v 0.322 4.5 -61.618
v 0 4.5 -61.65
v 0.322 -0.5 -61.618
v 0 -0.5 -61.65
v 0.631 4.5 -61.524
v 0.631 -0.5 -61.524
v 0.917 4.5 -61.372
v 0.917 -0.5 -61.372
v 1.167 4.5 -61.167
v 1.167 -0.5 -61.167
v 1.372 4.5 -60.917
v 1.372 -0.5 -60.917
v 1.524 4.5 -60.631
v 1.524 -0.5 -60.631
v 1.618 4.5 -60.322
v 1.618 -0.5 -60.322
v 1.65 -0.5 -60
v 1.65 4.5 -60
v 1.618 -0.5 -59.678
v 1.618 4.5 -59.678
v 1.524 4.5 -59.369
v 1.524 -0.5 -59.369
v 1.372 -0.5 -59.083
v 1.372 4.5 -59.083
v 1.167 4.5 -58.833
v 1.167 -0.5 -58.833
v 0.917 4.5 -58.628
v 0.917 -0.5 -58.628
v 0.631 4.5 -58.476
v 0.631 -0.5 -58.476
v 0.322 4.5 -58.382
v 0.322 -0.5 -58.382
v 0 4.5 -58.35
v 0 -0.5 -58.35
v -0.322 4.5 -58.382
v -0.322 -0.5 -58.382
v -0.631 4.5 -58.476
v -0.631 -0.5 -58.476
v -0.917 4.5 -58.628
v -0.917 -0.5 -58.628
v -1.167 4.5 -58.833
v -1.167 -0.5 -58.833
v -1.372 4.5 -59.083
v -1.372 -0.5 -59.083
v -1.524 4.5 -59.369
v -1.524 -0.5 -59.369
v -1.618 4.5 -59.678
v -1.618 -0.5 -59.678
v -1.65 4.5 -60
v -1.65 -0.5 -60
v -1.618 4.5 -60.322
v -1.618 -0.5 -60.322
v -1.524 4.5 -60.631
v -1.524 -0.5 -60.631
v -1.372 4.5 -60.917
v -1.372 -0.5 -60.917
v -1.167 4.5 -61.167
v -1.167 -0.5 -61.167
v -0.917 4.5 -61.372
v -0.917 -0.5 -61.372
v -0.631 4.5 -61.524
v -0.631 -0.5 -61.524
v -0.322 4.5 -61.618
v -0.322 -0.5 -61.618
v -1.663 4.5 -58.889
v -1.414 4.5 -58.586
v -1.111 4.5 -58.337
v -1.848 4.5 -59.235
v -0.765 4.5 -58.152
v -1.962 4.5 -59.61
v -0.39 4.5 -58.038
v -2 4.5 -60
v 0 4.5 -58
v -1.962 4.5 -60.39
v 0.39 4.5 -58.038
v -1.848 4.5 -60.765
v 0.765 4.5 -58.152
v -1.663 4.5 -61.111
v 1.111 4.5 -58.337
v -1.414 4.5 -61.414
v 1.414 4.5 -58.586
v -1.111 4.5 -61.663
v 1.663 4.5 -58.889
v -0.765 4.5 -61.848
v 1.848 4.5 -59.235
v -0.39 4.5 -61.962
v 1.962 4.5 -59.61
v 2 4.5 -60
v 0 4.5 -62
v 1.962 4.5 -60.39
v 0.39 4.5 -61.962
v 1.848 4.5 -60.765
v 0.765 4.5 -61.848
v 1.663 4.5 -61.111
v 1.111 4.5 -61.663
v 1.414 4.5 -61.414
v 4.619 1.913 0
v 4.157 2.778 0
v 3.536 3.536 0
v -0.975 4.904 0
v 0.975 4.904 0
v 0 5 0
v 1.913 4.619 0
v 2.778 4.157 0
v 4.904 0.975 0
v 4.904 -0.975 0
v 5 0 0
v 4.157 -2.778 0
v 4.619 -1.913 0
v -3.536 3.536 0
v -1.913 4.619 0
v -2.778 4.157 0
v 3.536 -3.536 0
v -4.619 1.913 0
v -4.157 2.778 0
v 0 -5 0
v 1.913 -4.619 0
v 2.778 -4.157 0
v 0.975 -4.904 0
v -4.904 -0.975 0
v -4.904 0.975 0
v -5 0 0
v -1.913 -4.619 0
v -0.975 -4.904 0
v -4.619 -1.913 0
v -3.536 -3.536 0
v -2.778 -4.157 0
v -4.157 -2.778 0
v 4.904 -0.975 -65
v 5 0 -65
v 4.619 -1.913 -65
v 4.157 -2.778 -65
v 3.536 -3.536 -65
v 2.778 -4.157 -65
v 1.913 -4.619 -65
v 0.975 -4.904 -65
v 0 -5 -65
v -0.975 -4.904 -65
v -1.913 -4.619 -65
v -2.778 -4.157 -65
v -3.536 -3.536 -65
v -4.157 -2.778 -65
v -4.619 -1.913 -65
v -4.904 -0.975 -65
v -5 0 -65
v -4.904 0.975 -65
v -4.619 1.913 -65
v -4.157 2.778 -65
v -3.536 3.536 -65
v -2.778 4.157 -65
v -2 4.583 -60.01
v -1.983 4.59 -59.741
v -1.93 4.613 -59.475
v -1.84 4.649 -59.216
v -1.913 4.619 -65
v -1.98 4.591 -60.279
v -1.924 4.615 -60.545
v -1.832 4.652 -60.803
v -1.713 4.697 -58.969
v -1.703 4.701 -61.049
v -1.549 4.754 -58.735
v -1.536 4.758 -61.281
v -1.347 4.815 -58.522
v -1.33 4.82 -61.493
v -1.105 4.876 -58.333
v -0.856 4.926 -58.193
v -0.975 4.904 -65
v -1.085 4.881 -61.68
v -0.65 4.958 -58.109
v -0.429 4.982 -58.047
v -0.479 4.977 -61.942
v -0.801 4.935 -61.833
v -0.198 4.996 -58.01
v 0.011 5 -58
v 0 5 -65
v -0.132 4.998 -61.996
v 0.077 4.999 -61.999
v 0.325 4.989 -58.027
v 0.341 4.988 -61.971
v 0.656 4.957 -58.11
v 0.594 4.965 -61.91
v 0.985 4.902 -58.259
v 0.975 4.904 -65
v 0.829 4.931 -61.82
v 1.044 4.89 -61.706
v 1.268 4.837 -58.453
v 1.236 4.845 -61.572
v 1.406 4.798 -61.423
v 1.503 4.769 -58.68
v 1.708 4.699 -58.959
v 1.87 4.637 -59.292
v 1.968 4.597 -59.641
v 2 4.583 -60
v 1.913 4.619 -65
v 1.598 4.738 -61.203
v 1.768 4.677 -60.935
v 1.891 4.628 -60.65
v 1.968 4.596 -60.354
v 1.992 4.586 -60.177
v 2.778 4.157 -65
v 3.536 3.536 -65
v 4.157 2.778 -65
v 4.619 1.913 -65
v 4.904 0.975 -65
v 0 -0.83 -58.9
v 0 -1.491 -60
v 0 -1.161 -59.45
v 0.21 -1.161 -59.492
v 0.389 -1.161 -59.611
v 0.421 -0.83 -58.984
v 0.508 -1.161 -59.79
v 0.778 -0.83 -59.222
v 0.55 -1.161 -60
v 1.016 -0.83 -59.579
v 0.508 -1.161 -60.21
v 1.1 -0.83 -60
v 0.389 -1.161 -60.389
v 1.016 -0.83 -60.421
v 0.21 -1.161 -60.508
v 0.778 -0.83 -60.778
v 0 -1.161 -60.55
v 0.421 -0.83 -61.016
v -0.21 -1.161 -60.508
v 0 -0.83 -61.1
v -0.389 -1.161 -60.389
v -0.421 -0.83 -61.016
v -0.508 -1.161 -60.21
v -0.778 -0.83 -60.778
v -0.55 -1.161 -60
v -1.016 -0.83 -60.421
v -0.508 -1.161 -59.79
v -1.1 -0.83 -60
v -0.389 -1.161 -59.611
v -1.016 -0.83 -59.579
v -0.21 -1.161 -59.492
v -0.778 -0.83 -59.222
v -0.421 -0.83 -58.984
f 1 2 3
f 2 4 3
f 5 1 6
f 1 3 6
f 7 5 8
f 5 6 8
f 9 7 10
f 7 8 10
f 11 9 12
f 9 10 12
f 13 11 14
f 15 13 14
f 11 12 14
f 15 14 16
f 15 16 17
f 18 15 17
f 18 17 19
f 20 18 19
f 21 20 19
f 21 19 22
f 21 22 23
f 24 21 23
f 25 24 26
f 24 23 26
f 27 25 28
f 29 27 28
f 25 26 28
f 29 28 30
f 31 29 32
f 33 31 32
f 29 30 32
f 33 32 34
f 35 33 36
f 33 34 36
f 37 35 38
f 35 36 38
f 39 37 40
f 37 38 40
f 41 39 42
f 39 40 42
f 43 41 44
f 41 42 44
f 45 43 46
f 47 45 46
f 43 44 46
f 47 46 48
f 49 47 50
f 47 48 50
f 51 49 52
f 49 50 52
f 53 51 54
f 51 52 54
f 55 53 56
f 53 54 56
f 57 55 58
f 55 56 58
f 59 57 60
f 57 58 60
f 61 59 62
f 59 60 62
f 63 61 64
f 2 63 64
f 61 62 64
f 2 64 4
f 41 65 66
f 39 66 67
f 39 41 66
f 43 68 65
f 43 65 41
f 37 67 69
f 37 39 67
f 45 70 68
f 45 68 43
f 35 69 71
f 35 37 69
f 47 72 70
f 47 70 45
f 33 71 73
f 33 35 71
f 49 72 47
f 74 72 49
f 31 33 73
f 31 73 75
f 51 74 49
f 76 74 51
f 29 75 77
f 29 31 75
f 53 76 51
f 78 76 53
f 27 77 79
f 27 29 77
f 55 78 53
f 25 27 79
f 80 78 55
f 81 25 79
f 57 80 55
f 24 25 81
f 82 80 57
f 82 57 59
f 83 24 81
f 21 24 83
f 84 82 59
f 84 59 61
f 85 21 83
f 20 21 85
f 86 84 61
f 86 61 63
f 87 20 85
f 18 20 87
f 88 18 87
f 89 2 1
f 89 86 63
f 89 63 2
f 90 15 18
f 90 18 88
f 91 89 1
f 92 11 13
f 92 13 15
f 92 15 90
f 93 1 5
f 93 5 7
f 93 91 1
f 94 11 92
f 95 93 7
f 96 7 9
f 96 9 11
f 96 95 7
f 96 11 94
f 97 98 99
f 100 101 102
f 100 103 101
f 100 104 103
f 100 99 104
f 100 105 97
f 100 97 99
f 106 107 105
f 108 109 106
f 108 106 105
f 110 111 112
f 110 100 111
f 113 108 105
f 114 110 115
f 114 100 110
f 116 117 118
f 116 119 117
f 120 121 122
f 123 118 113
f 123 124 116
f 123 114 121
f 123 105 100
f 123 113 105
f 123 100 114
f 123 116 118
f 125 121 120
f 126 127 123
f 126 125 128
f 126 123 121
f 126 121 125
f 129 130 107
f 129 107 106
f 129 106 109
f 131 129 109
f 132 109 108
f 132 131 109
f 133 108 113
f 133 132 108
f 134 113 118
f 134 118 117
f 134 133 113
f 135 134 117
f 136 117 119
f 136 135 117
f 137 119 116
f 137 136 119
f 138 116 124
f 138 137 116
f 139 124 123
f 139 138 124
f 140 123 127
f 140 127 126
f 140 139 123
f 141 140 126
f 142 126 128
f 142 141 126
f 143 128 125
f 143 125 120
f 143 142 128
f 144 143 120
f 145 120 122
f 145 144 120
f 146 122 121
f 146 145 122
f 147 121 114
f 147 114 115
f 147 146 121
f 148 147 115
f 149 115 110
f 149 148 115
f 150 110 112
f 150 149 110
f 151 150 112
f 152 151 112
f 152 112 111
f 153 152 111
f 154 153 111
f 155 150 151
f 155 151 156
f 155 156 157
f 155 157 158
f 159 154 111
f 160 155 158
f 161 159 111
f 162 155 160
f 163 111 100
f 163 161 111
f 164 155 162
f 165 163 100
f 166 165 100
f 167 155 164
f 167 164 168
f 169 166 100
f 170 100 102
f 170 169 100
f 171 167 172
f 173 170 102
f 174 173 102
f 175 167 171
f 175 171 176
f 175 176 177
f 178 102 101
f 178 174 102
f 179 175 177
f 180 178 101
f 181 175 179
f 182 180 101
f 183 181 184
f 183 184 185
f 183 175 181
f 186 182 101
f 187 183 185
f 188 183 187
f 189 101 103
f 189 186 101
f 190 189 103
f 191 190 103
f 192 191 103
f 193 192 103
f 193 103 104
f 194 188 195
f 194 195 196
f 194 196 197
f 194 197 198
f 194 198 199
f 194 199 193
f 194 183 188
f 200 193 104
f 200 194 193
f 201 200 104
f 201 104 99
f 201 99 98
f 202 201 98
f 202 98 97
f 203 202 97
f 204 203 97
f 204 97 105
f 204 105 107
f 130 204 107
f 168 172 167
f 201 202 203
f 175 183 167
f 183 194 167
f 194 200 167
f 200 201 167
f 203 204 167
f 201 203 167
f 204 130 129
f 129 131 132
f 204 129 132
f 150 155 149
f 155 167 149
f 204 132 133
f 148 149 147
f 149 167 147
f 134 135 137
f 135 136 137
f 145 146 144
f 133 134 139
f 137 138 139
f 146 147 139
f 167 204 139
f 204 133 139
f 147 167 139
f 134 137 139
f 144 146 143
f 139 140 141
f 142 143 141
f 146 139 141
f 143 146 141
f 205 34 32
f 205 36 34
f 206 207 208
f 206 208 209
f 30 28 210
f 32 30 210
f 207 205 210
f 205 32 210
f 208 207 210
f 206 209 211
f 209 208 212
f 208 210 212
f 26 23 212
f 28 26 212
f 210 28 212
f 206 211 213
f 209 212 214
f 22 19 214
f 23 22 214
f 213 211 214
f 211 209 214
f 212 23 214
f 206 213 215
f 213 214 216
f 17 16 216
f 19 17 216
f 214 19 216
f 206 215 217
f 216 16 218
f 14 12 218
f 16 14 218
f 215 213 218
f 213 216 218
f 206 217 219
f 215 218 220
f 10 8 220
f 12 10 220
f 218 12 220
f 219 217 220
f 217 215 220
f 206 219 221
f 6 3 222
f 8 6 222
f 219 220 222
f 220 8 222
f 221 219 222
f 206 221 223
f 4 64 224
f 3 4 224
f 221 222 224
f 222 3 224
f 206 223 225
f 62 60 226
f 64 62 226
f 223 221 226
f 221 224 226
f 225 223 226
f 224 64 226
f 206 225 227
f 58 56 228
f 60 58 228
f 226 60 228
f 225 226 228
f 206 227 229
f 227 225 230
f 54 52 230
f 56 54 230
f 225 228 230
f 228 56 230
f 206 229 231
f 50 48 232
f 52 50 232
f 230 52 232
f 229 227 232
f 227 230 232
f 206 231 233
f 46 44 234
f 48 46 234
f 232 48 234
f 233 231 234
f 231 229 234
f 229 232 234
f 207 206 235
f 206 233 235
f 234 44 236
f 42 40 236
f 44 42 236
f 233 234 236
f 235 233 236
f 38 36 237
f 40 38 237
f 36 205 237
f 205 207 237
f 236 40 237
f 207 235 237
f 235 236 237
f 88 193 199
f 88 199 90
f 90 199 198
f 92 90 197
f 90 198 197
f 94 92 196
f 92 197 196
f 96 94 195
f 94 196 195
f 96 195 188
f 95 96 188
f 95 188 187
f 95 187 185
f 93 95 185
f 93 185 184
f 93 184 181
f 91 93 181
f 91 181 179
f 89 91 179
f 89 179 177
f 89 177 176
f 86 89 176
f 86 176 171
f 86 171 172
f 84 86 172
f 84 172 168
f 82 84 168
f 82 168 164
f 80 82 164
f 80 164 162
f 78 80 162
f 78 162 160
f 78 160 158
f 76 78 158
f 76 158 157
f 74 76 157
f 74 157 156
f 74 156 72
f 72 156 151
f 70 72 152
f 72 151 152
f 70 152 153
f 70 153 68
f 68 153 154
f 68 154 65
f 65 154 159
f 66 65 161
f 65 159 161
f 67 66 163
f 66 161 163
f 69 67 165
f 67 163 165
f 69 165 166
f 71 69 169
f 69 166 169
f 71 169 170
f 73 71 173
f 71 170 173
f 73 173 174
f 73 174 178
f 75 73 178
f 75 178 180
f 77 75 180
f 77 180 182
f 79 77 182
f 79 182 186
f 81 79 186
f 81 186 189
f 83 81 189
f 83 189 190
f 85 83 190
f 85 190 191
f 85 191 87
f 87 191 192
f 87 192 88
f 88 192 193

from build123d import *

# Parameters (mm, degrees)
SKETCH_1_W             = 5
SKETCH_1_H             = 65
SKETCH_2_R             = 2
CUT_EXTRUDE_1_DEPTH    = 0.5
HOLE_WIZARD_M4_2_D     = 3.3
HOLE_WIZARD_M4_2_DEPTH = 5
HOLE_WIZARD_M4_2_TIP   = 0.991420021


with BuildPart() as part:
    # 草圖1 → 旋轉1 (revolve)
    with BuildSketch(Plane(origin=(0, 0, 0), x_dir=(1, 0, 0), z_dir=(0, 1, 0))):
        with Locations((2.5, 32.5)):
            Rectangle(SKETCH_1_W, SKETCH_1_H)
    revolve(axis=Axis((0, 0, 16.74665181), (0, 0, -1)))

    # 草圖2 → 除料-伸長1 (cut)
    with BuildSketch(Plane(origin=(0, 5, 0), x_dir=(1, 0, 0), z_dir=(0, 1, 0))):
        with Locations((0, 60)):
            Circle(SKETCH_2_R)
    extrude(amount=-CUT_EXTRUDE_1_DEPTH, mode=Mode.SUBTRACT)

    # M4 螺紋孔2
    with Locations(Plane(origin=(0, 4.5, -60), x_dir=(0, 0, 1), z_dir=(0, 1, 0))):
        with Locations((0, 0)):
            Hole(HOLE_WIZARD_M4_2_D / 2, depth=HOLE_WIZARD_M4_2_DEPTH)
            with Locations((0, 0, -(HOLE_WIZARD_M4_2_DEPTH + HOLE_WIZARD_M4_2_TIP / 2))):  # 118° drill point
                Cone(0, HOLE_WIZARD_M4_2_D / 2, HOLE_WIZARD_M4_2_TIP, mode=Mode.SUBTRACT)


solid = part.part
